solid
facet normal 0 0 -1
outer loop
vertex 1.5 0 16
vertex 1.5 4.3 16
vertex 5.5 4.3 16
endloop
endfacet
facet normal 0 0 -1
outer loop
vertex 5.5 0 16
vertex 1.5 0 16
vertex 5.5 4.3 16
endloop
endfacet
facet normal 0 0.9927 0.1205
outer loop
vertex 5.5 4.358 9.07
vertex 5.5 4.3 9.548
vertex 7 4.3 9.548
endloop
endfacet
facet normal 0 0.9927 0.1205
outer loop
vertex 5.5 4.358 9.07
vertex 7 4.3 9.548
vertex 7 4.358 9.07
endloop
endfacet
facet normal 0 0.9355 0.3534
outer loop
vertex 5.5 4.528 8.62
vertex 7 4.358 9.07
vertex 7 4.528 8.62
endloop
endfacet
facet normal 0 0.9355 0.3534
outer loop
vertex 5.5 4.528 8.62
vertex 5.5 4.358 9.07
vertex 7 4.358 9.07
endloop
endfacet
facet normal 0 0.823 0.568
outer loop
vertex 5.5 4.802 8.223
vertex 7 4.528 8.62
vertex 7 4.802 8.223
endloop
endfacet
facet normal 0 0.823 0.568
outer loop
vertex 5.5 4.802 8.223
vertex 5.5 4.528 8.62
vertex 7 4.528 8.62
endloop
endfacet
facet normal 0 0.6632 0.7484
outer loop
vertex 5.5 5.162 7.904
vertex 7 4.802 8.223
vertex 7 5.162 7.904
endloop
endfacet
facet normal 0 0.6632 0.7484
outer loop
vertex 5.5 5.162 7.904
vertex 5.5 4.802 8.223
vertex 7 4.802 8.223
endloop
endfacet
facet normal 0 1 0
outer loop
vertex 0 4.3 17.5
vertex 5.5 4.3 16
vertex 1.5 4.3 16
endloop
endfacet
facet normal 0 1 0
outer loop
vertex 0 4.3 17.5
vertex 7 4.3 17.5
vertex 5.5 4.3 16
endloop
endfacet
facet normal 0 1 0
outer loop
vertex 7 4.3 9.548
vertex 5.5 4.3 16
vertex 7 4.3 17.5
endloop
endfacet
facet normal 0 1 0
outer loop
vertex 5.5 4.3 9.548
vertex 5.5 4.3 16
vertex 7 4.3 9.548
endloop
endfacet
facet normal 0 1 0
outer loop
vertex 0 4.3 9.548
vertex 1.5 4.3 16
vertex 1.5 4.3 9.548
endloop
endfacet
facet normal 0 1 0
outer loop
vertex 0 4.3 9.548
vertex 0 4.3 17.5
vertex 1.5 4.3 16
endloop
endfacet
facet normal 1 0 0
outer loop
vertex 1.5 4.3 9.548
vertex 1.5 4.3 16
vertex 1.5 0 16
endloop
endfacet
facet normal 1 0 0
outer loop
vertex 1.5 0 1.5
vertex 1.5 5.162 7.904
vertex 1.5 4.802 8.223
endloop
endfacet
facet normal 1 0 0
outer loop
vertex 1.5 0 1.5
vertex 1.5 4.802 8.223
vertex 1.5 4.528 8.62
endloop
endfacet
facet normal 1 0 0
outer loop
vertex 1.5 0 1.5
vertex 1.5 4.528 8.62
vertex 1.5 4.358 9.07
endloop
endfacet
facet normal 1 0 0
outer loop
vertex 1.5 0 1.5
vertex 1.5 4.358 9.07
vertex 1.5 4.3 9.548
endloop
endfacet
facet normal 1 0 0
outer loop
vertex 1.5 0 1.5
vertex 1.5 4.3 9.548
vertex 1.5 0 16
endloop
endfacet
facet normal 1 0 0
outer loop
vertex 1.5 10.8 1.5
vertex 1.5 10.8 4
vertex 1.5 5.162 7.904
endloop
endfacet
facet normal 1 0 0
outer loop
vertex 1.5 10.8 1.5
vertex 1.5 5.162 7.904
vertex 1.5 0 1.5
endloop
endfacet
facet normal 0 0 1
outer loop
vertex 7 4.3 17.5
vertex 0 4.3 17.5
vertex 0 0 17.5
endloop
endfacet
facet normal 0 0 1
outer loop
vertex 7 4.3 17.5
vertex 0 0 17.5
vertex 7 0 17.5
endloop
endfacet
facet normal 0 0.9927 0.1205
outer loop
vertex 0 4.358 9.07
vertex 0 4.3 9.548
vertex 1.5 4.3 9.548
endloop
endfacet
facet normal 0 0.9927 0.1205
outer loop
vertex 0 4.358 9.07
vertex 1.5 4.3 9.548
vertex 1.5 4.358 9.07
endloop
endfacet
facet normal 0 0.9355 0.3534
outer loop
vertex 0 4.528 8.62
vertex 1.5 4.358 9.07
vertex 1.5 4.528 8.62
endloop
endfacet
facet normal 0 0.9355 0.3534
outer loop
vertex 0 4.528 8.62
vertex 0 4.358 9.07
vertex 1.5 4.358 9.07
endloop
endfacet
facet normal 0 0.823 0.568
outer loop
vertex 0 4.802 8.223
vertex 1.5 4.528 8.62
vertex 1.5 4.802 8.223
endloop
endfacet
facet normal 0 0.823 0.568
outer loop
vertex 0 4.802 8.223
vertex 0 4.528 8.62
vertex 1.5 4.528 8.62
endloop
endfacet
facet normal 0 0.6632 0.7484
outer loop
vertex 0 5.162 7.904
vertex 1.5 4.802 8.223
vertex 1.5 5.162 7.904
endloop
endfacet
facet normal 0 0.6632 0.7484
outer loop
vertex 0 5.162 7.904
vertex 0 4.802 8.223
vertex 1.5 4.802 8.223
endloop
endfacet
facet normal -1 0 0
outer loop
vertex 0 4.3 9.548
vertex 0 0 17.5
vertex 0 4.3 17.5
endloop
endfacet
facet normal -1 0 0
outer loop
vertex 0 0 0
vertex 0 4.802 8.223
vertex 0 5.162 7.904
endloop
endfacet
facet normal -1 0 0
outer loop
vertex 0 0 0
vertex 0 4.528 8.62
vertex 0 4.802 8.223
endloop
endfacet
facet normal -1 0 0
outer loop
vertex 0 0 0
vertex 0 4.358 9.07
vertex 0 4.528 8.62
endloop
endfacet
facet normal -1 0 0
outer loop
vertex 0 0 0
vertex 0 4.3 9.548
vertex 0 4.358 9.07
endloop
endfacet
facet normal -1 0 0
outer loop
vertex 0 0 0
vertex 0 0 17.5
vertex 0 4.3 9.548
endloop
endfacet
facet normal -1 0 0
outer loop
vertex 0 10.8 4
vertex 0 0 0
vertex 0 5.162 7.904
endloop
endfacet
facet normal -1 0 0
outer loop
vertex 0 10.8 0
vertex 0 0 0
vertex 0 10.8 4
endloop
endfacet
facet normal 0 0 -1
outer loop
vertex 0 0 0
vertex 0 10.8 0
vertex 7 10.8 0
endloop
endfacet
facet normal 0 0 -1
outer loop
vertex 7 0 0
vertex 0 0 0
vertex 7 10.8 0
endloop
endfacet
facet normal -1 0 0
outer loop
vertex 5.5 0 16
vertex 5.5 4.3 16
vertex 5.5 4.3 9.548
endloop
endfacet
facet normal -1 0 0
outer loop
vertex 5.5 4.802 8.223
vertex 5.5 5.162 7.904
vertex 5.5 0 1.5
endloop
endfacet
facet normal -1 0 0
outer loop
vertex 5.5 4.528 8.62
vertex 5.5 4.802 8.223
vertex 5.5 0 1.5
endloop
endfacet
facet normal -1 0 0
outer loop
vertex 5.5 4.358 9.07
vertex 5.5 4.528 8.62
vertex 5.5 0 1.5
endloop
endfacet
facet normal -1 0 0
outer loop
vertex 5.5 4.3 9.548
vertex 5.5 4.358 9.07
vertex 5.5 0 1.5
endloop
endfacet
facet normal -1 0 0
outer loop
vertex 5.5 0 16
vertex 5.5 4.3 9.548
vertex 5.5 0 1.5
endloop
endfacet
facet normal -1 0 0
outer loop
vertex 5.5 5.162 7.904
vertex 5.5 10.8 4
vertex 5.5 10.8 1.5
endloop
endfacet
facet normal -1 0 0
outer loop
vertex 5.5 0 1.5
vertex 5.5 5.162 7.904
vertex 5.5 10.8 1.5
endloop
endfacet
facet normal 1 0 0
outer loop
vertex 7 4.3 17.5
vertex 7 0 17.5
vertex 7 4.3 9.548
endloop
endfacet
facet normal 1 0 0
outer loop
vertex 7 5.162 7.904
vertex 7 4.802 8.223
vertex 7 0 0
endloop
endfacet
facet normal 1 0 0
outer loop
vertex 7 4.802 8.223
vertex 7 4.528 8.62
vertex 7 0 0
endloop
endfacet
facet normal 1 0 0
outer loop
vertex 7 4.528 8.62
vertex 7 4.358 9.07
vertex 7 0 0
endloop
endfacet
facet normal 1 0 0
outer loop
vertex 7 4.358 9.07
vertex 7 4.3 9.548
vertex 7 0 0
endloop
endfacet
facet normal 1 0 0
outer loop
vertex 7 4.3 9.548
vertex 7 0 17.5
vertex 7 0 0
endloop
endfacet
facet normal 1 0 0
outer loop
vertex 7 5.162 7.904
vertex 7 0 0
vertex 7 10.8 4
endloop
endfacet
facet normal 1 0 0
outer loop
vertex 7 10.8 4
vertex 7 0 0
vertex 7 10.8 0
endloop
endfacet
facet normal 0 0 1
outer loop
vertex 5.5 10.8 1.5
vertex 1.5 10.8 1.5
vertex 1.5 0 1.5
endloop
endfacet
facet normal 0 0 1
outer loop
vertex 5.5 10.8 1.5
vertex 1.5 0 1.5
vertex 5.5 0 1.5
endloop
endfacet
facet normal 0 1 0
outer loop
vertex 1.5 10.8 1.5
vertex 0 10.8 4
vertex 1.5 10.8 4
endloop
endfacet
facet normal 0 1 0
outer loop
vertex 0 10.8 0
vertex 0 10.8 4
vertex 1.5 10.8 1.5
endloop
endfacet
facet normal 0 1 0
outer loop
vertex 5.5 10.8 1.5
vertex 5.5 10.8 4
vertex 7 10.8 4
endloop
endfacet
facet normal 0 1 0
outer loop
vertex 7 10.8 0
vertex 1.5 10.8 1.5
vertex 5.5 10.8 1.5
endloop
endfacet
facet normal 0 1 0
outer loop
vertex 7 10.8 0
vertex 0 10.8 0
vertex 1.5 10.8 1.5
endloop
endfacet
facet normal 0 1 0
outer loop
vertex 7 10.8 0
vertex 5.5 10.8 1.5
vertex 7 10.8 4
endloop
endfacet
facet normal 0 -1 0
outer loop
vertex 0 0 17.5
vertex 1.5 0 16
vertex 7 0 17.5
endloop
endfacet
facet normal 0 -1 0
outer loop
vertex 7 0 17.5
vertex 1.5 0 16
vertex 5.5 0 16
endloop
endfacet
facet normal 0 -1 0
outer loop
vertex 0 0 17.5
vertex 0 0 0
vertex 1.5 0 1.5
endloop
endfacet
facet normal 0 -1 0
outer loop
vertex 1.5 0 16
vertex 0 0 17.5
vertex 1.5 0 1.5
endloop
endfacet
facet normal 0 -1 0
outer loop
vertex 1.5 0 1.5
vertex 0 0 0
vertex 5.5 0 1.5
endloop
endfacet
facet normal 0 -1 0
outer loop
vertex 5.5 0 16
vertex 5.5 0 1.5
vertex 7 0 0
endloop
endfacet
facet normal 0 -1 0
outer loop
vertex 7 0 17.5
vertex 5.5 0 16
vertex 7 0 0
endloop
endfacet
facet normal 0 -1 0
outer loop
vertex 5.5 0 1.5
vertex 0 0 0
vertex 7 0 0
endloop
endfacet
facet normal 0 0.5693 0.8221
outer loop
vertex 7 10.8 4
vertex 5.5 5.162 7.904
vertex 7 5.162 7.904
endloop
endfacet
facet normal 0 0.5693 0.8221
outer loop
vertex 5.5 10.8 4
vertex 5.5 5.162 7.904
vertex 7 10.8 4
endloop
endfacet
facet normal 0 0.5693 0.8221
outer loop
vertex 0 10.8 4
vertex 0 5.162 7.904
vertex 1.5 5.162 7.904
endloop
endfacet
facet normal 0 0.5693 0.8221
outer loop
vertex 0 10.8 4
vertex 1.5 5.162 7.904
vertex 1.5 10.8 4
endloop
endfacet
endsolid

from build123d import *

# Parameters (mm, degrees)
CROQUIS1_W                 = 7
CROQUIS1_H                 = 10.8
SALIENTE_EXTRUIR1_DEPTH    = 17.5
CROQUIS4_W                 = 3.5
CROQUIS4_H                 = 14.5
CORTAR_EXTRUIR1_DEPTH      = 17.5
CORTAR_EXTRUIR2_DEPTH      = 22.723029255
CORTAR_EXTRUIR2_DEPTH_BACK = 22.723029255
CROQUIS6_W                 = 4
CROQUIS6_H                 = 14.5
CORTAR_EXTRUIR3_DEPTH      = 17.5


with BuildPart() as part:
    # Croquis1 → Saliente-Extruir1 (new body)
    with BuildSketch(Plane.XY):
        with Locations((3.5, 5.4)):
            Rectangle(CROQUIS1_W, CROQUIS1_H)
    extrude(amount=SALIENTE_EXTRUIR1_DEPTH)

    # Croquis4 → Cortar-Extruir1 (cut)
    with BuildSketch(Plane(origin=(0, 10.8, 0), x_dir=(1, 0, 0), z_dir=(0, 1, 0))):
        with Locations((3.25, -8.75)):
            Rectangle(CROQUIS4_W, CROQUIS4_H)
    extrude(amount=-CORTAR_EXTRUIR1_DEPTH, mode=Mode.SUBTRACT)

    # Croquis5 → Cortar-Extruir2 (cut, two sides: drawn at the far end of the back side and taken through both)
    with BuildSketch(Plane(origin=(7, 0, 0), x_dir=(0, 0, -1), z_dir=(1, 0, 0)).offset(-CORTAR_EXTRUIR2_DEPTH_BACK)):
        with BuildLine():
            Line((-7.903521509, 5.161580042), (-4, 10.8))
            Line((-4, 10.8), (-17.5, 10.8))
            Line((-17.5, 10.8), (-17.5, 4.3))
            Line((-17.5, 4.3), (-9.547905892, 4.3))
            ThreePointArc((-9.547905892, 4.3), (-8.619692532, 4.528441376), (-7.903521509, 5.161580042))
        make_face()
    extrude(amount=CORTAR_EXTRUIR2_DEPTH + CORTAR_EXTRUIR2_DEPTH_BACK, mode=Mode.SUBTRACT)

    # Croquis6 → Cortar-Extruir3 (cut)
    with BuildSketch(Plane(origin=(0, 10.8, 0), x_dir=(1, 0, 0), z_dir=(0, 1, 0))):
        with Locations((3.5, -8.75)):
            Rectangle(CROQUIS6_W, CROQUIS6_H)
    extrude(amount=-CORTAR_EXTRUIR3_DEPTH, mode=Mode.SUBTRACT)


solid = part.part
